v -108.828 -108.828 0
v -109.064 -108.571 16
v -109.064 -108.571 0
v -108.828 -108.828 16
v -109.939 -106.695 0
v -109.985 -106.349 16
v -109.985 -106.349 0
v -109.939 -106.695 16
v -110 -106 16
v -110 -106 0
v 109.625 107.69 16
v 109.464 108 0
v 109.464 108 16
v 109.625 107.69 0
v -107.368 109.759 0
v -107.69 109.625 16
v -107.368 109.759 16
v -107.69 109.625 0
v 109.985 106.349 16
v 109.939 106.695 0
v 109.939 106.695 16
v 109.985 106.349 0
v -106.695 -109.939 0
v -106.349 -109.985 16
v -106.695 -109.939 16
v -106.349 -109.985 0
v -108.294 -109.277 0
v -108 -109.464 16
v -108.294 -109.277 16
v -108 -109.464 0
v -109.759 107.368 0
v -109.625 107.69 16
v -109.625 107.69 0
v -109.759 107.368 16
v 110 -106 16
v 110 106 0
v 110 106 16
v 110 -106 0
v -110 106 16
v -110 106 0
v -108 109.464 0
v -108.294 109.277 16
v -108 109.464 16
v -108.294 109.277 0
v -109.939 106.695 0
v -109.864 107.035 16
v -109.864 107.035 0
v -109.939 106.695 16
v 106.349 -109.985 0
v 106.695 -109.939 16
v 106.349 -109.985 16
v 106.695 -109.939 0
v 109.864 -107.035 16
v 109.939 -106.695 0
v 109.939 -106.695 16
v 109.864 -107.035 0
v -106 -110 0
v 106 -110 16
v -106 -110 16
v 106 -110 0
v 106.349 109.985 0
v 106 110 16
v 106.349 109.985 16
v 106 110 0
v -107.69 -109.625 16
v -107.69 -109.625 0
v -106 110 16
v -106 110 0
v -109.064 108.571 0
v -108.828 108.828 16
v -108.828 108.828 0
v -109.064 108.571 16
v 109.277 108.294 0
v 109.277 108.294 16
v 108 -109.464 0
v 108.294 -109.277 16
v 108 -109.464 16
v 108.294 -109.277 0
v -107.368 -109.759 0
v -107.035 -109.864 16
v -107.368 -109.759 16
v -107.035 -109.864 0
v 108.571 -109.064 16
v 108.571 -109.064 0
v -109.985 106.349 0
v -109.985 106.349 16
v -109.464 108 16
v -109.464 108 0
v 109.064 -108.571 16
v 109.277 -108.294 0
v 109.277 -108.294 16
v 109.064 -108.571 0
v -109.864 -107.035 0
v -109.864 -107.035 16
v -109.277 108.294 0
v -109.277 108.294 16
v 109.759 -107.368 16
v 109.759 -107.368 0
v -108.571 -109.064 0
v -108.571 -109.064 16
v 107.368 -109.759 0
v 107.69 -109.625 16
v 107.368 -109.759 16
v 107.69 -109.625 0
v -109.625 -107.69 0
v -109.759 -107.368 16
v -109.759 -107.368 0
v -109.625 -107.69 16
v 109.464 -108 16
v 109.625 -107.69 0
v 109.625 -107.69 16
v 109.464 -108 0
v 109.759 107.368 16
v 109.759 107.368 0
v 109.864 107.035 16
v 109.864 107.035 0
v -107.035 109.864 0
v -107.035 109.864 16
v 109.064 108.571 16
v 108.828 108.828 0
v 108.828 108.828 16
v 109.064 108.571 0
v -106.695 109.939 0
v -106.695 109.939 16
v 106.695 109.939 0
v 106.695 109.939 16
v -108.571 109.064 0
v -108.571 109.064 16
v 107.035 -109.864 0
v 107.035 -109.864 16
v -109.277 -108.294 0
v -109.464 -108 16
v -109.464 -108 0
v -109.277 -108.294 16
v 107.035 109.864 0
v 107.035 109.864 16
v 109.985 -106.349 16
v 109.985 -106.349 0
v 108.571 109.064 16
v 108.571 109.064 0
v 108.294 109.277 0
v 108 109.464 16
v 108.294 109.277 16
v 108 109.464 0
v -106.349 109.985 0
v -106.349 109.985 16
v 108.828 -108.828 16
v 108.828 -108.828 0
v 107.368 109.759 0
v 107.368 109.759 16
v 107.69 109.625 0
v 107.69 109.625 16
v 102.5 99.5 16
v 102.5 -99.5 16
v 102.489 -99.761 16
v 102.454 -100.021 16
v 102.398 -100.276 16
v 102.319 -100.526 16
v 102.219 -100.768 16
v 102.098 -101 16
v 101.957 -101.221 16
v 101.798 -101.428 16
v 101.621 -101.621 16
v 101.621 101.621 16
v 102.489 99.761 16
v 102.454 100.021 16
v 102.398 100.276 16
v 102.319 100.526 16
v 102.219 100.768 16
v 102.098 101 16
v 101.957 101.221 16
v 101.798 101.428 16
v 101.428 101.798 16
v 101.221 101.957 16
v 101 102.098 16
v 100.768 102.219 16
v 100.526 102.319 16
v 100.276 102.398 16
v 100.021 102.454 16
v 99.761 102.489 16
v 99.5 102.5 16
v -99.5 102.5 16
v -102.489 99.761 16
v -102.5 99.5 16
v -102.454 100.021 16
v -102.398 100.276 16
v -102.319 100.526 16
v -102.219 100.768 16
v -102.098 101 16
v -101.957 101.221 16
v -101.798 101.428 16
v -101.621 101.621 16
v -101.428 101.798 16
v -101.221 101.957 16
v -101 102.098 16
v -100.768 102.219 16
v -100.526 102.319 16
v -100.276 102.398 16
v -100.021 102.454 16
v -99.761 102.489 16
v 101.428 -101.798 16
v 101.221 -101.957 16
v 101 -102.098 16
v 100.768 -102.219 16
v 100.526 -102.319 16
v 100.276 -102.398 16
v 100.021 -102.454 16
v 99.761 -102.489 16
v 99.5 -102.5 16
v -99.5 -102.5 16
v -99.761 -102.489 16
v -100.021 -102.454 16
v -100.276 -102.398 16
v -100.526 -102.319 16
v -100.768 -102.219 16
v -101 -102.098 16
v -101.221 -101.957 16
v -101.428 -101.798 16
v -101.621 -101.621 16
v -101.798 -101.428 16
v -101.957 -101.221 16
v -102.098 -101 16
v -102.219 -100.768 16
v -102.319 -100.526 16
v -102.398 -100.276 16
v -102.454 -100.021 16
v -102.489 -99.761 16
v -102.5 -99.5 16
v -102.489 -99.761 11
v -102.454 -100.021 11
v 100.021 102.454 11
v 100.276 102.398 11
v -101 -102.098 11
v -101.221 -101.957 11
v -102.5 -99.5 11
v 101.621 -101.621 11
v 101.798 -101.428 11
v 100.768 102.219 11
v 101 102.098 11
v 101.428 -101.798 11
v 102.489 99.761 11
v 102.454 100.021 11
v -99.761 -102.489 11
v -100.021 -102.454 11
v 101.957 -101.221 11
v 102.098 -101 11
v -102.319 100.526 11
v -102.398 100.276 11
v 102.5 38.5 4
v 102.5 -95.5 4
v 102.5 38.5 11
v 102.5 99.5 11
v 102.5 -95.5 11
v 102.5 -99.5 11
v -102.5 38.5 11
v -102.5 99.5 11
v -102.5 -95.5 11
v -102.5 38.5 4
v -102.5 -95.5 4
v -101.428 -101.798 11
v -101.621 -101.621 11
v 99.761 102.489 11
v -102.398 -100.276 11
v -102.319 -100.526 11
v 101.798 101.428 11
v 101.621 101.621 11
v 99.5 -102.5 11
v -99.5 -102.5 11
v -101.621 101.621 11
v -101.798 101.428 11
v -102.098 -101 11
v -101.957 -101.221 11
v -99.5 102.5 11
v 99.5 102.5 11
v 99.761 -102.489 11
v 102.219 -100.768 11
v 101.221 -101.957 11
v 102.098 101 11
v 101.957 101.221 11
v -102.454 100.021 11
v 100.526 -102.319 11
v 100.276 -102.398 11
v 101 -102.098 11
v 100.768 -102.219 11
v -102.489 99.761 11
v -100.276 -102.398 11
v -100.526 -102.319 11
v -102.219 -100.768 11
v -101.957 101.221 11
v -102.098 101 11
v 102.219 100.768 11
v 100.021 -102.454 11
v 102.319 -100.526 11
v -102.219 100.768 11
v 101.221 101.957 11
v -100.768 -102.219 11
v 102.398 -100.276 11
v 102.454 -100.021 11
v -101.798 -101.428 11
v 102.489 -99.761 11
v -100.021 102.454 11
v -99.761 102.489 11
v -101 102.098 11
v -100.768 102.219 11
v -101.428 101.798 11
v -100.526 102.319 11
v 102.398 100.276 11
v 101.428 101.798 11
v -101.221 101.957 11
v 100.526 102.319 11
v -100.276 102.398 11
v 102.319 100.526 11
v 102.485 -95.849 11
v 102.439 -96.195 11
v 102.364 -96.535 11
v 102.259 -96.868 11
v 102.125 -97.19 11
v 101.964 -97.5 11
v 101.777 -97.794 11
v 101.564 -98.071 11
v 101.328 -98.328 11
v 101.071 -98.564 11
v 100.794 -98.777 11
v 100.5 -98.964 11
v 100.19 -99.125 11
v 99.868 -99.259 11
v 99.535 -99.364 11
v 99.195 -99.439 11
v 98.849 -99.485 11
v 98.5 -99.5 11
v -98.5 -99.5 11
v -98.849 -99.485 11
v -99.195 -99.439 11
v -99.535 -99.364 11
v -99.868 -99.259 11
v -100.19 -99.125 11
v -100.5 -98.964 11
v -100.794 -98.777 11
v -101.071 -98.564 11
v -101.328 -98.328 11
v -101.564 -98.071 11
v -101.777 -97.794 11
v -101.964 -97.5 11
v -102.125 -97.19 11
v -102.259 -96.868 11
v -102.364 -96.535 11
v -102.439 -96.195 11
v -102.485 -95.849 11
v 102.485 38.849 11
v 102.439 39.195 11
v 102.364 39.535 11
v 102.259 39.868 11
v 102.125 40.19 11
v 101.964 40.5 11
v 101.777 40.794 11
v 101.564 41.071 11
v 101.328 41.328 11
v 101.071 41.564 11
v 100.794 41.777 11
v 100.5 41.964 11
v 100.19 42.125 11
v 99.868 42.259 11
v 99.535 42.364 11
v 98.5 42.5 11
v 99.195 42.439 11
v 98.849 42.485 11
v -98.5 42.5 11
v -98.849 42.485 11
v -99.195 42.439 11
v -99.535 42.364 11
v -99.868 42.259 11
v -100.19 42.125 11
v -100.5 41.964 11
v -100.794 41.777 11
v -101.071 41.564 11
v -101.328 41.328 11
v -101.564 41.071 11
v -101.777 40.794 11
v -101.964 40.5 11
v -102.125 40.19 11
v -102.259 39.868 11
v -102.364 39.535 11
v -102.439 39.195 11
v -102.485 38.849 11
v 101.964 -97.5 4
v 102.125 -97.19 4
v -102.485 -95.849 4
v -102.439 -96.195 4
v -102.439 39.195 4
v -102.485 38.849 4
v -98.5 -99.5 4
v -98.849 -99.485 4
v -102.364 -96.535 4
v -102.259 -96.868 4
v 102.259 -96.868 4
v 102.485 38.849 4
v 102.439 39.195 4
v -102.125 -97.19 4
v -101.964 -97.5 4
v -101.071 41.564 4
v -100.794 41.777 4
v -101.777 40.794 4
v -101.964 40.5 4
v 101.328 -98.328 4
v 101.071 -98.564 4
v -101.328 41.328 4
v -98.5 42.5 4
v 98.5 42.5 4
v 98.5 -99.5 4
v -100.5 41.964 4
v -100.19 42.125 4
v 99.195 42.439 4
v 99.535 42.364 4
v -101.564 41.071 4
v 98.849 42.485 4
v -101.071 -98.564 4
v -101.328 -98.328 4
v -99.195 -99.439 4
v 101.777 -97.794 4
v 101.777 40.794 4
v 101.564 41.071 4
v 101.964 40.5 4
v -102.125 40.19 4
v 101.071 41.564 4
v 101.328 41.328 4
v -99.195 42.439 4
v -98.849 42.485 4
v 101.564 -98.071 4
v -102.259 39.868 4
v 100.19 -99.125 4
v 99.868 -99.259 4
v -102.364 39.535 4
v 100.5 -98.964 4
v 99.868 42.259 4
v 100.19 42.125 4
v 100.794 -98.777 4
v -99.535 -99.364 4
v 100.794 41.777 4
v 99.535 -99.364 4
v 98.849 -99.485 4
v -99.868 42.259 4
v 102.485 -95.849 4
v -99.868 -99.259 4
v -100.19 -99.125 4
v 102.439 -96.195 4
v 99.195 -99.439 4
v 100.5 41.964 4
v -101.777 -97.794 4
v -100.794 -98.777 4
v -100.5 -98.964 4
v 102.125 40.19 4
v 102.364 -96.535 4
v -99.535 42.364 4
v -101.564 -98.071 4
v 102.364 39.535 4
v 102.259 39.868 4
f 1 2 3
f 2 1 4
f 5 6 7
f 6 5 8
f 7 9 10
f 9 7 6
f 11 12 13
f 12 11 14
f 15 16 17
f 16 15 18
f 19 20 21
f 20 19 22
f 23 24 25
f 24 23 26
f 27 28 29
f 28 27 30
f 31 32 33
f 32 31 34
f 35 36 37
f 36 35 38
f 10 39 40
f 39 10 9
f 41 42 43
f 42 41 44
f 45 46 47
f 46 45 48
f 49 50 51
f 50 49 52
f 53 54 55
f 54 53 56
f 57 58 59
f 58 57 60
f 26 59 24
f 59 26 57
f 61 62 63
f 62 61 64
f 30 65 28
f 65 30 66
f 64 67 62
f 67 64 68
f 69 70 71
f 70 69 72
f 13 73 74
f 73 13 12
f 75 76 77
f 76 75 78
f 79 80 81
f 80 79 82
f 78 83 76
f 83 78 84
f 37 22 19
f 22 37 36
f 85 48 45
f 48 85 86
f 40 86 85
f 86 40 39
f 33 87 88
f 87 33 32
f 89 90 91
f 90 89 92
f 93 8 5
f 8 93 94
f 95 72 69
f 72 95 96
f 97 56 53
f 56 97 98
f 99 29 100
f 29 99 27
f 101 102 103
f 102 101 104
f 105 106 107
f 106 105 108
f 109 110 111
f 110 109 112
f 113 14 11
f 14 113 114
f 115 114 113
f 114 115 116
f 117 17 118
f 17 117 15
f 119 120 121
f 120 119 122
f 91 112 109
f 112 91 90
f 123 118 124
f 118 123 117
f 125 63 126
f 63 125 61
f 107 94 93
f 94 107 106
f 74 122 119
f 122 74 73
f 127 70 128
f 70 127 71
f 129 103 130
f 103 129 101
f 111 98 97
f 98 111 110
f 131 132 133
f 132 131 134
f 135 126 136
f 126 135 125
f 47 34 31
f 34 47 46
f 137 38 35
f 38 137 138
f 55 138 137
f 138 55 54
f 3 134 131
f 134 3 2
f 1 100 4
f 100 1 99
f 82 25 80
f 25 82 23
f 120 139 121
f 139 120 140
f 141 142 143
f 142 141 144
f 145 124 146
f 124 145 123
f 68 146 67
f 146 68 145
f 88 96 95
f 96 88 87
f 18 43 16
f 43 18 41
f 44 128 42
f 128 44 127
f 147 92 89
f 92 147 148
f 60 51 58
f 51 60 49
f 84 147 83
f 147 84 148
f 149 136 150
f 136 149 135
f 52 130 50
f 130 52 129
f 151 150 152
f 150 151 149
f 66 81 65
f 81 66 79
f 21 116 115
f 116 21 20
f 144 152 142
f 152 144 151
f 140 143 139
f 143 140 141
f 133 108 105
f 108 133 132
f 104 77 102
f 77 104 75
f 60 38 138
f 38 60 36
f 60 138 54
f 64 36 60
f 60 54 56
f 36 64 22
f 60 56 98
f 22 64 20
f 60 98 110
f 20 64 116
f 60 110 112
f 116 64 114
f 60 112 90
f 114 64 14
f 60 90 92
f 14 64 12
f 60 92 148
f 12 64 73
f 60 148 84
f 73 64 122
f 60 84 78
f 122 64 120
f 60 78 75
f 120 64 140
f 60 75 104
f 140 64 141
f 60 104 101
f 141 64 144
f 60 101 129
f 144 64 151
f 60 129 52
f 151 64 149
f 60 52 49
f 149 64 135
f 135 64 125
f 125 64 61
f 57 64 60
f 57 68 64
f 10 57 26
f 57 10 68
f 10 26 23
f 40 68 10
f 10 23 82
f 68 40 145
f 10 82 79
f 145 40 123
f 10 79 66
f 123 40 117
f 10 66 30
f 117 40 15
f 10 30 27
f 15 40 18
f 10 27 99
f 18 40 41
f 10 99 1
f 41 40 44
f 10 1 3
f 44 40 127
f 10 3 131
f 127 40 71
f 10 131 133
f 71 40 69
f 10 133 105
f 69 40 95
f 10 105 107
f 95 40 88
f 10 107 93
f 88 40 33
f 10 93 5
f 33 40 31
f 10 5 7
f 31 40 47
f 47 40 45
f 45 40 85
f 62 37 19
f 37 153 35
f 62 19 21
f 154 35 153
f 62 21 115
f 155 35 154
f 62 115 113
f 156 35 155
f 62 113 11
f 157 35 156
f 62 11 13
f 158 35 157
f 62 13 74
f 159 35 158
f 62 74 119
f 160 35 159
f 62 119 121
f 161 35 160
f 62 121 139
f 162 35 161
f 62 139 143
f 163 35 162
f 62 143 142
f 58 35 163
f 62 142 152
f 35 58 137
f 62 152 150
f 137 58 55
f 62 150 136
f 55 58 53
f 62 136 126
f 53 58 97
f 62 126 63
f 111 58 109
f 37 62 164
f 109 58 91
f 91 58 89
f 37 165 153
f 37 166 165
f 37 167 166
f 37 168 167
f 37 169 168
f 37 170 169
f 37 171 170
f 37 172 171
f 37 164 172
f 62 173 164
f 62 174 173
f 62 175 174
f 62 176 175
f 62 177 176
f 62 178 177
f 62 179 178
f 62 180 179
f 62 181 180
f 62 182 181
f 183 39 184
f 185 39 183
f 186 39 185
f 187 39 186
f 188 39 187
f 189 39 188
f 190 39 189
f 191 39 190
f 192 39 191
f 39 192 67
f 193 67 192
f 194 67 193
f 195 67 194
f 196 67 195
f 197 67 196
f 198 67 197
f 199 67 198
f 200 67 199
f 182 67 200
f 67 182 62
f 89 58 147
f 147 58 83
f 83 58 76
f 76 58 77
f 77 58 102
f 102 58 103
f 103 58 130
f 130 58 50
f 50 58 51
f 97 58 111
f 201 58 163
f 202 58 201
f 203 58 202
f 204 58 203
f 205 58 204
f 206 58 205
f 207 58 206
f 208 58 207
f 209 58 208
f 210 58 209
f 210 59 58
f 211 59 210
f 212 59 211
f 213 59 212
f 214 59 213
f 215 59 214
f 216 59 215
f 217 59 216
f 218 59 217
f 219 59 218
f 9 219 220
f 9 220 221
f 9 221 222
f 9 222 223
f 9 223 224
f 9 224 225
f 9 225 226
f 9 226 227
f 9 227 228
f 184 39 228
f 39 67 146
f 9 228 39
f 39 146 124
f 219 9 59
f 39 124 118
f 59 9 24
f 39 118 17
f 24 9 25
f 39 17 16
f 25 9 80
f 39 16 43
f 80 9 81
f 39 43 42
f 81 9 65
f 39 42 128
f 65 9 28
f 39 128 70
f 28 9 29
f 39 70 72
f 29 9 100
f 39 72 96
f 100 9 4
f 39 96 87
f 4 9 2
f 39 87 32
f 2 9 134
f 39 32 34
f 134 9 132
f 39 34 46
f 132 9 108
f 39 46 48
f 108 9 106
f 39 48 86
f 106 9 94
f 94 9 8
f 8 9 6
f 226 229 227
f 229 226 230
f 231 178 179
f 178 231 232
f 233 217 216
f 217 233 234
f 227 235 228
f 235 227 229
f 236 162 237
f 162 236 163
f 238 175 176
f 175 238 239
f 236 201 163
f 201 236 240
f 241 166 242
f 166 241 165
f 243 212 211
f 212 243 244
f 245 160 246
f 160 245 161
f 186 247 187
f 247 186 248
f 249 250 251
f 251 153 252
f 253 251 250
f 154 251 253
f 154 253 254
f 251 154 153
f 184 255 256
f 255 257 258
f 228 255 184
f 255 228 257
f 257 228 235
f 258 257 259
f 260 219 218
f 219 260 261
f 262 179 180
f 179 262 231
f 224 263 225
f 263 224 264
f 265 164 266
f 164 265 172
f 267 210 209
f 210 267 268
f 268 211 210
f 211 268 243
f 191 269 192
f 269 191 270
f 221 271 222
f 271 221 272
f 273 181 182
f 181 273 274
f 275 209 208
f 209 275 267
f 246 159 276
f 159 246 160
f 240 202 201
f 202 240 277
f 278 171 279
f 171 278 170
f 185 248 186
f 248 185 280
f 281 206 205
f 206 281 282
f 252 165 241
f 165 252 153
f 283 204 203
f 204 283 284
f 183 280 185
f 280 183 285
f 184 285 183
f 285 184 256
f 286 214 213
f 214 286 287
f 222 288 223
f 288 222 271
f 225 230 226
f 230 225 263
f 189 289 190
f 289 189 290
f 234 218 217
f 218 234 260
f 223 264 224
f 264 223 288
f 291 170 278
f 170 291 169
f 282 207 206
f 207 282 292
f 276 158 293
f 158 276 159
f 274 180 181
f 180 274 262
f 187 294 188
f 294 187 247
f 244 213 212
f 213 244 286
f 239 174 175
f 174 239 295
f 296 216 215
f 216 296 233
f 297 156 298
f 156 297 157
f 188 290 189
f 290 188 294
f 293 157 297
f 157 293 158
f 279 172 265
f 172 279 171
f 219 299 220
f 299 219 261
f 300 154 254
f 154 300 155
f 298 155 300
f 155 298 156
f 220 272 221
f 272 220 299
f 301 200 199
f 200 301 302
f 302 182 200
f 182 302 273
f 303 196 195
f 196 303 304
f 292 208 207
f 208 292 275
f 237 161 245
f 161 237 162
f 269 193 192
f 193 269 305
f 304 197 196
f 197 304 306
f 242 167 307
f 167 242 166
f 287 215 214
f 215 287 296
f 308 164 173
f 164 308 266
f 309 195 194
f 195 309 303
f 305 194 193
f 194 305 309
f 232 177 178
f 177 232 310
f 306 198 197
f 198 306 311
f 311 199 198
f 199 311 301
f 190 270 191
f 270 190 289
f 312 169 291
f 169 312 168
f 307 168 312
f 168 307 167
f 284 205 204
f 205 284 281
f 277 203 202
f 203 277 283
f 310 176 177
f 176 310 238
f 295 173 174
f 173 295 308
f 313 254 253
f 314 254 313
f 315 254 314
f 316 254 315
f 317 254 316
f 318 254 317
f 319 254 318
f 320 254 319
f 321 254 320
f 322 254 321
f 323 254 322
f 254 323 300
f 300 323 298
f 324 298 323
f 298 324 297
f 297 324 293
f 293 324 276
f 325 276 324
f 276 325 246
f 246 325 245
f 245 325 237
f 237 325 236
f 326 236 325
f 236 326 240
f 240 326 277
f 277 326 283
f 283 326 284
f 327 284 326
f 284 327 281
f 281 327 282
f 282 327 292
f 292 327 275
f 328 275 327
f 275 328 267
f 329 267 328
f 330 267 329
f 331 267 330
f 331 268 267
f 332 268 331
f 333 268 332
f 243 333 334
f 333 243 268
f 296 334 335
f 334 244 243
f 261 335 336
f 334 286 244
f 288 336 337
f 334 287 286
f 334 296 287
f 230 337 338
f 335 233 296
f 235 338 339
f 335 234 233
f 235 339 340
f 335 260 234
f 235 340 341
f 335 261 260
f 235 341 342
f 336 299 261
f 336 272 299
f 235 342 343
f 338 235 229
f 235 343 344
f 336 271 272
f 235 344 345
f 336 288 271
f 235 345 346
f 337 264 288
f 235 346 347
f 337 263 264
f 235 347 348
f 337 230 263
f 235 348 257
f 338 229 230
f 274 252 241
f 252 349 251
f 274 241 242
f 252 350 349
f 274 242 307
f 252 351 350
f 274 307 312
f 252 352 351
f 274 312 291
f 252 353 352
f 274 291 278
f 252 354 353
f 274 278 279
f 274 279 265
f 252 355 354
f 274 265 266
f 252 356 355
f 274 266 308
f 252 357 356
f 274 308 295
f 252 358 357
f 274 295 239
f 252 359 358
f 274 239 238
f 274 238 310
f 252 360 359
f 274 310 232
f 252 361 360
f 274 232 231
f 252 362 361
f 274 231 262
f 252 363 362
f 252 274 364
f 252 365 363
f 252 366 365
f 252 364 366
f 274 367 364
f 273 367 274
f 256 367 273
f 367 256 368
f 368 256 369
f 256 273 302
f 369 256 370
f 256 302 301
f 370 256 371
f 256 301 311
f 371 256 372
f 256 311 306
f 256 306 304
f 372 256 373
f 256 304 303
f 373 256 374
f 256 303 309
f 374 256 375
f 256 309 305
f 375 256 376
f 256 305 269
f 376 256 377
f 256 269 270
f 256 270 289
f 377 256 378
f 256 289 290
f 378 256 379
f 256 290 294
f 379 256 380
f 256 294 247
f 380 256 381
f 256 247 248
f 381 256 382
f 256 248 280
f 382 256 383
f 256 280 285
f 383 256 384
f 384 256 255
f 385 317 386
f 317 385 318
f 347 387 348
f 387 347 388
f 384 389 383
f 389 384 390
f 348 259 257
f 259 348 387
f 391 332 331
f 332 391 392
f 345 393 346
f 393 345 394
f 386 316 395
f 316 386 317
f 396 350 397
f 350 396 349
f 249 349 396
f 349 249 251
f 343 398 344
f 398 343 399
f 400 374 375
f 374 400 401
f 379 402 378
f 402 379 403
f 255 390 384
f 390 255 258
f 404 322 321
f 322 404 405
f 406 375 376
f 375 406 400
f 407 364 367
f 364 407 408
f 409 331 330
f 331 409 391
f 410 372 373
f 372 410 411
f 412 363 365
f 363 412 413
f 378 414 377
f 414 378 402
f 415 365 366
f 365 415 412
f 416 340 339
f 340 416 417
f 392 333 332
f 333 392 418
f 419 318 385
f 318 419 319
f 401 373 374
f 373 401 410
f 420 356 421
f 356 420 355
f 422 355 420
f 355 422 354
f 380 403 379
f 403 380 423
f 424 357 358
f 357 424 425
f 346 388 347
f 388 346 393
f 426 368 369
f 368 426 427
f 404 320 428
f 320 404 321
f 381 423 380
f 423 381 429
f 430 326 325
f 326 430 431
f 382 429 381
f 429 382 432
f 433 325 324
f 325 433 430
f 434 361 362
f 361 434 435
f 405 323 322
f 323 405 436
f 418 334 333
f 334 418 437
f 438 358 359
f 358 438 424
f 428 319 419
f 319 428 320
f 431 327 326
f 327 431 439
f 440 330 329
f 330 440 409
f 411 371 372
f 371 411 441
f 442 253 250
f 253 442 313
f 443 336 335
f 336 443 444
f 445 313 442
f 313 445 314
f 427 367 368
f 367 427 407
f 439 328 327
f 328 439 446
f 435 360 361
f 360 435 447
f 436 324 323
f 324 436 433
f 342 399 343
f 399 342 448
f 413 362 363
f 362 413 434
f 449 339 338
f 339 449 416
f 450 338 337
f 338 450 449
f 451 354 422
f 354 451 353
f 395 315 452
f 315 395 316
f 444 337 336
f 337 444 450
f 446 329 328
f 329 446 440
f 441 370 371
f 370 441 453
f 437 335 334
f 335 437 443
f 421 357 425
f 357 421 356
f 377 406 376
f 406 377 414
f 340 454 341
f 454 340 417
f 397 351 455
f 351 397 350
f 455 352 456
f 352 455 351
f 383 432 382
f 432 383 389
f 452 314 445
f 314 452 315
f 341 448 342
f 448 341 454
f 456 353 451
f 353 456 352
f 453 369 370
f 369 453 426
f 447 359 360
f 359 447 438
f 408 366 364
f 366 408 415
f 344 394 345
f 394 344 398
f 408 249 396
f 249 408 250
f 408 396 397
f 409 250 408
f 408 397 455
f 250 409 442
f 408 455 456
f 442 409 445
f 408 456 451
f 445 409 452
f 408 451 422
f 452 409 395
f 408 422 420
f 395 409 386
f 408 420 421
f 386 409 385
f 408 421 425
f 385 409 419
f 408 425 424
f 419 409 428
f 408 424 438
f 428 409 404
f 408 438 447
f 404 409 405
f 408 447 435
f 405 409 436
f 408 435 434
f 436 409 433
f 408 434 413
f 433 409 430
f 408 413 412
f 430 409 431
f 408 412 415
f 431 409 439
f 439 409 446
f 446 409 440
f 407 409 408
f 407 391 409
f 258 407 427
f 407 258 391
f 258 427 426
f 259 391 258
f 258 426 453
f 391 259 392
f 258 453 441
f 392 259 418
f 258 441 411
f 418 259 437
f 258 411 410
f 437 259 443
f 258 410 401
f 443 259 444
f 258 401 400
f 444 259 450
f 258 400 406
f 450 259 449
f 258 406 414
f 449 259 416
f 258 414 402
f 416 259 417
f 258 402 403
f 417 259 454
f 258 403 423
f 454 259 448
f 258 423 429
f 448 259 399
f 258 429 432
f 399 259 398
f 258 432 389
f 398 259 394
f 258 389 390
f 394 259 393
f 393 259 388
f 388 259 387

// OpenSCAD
// Cosmic Unicorn casing / routing template
// Measurements are in millimeters.
//
// Based on a 220 x 220 x 16 mm board with a centered two-depth pocket.

$fn = 72;

board_w = 220;
board_h = 220;
board_t = 16;
board_corner_r = 4;

display_w = 204;
display_h = 204;

pocket_w = 205;
pocket_h = 205;
pocket_depth = 12;

top_shoulder_h = 60;
bottom_shoulder_h = 3;
shoulder_cut_depth = 5;
shoulder_height = pocket_depth - shoulder_cut_depth;

cutter_d = 6;
corner_r = cutter_d / 2;
deep_cutter_d = 8;
deep_corner_r = deep_cutter_d / 2;

show_requested_footprint = false;
show_display_reference = false;

rim_x = (board_w - pocket_w) / 2;
rim_y = (board_h - pocket_h) / 2;

if (rim_x < 0 || rim_y < 0) {
    echo(str(
        "WARNING: The pocket is larger than the board. Margin X=",
        rim_x,
        " mm, Y=",
        rim_y,
        " mm. Increase the board size or reduce pocket_w/pocket_h."
    ));
}

module rounded_rect_2d(w, h, r) {
    assert(w >= 2 * r, "Width must be at least 2 x the corner radius.");
    assert(h >= 2 * r, "Height must be at least 2 x the corner radius.");

    hull() {
        translate([ w / 2 - r,  h / 2 - r]) circle(r = r);
        translate([-w / 2 + r,  h / 2 - r]) circle(r = r);
        translate([ w / 2 - r, -h / 2 + r]) circle(r = r);
        translate([-w / 2 + r, -h / 2 + r]) circle(r = r);
    }
}

module rounded_box(w, h, z, r) {
    linear_extrude(height = z)
        rounded_rect_2d(w, h, r);
}

module board_blank() {
    rounded_box(board_w, board_h, board_t, board_corner_r);
}

module shoulder_cutter() {
    translate([0, 0, board_t - shoulder_cut_depth])
        rounded_box(pocket_w, pocket_h, shoulder_cut_depth + 0.2, corner_r);
}

module deep_pocket_cutter() {
    inner_w = pocket_w;
    inner_h = pocket_h - top_shoulder_h - bottom_shoulder_h;
    inner_y = (bottom_shoulder_h - top_shoulder_h) / 2;

    translate([0, inner_y, board_t - pocket_depth])
        rounded_box(inner_w, inner_h, pocket_depth + 0.2, deep_corner_r);
}

module milled_board() {
    difference() {
        board_blank();
        shoulder_cutter();
        deep_pocket_cutter();

    }
}

module display_reference() {
    color([0.05, 0.05, 0.05, 0.45])
        translate([0, 0, board_t + 0.4])
            rounded_box(display_w, display_h, 1.2, corner_r);
}

module requested_footprint() {
    color([1, 0.15, 0.05, 0.28])
        translate([0, 0, board_t + 1.8])
            rounded_box(pocket_w, pocket_h, 1.0, corner_r);
}

milled_board();

if (show_display_reference)
    display_reference();

if (show_requested_footprint)
    requested_footprint();
